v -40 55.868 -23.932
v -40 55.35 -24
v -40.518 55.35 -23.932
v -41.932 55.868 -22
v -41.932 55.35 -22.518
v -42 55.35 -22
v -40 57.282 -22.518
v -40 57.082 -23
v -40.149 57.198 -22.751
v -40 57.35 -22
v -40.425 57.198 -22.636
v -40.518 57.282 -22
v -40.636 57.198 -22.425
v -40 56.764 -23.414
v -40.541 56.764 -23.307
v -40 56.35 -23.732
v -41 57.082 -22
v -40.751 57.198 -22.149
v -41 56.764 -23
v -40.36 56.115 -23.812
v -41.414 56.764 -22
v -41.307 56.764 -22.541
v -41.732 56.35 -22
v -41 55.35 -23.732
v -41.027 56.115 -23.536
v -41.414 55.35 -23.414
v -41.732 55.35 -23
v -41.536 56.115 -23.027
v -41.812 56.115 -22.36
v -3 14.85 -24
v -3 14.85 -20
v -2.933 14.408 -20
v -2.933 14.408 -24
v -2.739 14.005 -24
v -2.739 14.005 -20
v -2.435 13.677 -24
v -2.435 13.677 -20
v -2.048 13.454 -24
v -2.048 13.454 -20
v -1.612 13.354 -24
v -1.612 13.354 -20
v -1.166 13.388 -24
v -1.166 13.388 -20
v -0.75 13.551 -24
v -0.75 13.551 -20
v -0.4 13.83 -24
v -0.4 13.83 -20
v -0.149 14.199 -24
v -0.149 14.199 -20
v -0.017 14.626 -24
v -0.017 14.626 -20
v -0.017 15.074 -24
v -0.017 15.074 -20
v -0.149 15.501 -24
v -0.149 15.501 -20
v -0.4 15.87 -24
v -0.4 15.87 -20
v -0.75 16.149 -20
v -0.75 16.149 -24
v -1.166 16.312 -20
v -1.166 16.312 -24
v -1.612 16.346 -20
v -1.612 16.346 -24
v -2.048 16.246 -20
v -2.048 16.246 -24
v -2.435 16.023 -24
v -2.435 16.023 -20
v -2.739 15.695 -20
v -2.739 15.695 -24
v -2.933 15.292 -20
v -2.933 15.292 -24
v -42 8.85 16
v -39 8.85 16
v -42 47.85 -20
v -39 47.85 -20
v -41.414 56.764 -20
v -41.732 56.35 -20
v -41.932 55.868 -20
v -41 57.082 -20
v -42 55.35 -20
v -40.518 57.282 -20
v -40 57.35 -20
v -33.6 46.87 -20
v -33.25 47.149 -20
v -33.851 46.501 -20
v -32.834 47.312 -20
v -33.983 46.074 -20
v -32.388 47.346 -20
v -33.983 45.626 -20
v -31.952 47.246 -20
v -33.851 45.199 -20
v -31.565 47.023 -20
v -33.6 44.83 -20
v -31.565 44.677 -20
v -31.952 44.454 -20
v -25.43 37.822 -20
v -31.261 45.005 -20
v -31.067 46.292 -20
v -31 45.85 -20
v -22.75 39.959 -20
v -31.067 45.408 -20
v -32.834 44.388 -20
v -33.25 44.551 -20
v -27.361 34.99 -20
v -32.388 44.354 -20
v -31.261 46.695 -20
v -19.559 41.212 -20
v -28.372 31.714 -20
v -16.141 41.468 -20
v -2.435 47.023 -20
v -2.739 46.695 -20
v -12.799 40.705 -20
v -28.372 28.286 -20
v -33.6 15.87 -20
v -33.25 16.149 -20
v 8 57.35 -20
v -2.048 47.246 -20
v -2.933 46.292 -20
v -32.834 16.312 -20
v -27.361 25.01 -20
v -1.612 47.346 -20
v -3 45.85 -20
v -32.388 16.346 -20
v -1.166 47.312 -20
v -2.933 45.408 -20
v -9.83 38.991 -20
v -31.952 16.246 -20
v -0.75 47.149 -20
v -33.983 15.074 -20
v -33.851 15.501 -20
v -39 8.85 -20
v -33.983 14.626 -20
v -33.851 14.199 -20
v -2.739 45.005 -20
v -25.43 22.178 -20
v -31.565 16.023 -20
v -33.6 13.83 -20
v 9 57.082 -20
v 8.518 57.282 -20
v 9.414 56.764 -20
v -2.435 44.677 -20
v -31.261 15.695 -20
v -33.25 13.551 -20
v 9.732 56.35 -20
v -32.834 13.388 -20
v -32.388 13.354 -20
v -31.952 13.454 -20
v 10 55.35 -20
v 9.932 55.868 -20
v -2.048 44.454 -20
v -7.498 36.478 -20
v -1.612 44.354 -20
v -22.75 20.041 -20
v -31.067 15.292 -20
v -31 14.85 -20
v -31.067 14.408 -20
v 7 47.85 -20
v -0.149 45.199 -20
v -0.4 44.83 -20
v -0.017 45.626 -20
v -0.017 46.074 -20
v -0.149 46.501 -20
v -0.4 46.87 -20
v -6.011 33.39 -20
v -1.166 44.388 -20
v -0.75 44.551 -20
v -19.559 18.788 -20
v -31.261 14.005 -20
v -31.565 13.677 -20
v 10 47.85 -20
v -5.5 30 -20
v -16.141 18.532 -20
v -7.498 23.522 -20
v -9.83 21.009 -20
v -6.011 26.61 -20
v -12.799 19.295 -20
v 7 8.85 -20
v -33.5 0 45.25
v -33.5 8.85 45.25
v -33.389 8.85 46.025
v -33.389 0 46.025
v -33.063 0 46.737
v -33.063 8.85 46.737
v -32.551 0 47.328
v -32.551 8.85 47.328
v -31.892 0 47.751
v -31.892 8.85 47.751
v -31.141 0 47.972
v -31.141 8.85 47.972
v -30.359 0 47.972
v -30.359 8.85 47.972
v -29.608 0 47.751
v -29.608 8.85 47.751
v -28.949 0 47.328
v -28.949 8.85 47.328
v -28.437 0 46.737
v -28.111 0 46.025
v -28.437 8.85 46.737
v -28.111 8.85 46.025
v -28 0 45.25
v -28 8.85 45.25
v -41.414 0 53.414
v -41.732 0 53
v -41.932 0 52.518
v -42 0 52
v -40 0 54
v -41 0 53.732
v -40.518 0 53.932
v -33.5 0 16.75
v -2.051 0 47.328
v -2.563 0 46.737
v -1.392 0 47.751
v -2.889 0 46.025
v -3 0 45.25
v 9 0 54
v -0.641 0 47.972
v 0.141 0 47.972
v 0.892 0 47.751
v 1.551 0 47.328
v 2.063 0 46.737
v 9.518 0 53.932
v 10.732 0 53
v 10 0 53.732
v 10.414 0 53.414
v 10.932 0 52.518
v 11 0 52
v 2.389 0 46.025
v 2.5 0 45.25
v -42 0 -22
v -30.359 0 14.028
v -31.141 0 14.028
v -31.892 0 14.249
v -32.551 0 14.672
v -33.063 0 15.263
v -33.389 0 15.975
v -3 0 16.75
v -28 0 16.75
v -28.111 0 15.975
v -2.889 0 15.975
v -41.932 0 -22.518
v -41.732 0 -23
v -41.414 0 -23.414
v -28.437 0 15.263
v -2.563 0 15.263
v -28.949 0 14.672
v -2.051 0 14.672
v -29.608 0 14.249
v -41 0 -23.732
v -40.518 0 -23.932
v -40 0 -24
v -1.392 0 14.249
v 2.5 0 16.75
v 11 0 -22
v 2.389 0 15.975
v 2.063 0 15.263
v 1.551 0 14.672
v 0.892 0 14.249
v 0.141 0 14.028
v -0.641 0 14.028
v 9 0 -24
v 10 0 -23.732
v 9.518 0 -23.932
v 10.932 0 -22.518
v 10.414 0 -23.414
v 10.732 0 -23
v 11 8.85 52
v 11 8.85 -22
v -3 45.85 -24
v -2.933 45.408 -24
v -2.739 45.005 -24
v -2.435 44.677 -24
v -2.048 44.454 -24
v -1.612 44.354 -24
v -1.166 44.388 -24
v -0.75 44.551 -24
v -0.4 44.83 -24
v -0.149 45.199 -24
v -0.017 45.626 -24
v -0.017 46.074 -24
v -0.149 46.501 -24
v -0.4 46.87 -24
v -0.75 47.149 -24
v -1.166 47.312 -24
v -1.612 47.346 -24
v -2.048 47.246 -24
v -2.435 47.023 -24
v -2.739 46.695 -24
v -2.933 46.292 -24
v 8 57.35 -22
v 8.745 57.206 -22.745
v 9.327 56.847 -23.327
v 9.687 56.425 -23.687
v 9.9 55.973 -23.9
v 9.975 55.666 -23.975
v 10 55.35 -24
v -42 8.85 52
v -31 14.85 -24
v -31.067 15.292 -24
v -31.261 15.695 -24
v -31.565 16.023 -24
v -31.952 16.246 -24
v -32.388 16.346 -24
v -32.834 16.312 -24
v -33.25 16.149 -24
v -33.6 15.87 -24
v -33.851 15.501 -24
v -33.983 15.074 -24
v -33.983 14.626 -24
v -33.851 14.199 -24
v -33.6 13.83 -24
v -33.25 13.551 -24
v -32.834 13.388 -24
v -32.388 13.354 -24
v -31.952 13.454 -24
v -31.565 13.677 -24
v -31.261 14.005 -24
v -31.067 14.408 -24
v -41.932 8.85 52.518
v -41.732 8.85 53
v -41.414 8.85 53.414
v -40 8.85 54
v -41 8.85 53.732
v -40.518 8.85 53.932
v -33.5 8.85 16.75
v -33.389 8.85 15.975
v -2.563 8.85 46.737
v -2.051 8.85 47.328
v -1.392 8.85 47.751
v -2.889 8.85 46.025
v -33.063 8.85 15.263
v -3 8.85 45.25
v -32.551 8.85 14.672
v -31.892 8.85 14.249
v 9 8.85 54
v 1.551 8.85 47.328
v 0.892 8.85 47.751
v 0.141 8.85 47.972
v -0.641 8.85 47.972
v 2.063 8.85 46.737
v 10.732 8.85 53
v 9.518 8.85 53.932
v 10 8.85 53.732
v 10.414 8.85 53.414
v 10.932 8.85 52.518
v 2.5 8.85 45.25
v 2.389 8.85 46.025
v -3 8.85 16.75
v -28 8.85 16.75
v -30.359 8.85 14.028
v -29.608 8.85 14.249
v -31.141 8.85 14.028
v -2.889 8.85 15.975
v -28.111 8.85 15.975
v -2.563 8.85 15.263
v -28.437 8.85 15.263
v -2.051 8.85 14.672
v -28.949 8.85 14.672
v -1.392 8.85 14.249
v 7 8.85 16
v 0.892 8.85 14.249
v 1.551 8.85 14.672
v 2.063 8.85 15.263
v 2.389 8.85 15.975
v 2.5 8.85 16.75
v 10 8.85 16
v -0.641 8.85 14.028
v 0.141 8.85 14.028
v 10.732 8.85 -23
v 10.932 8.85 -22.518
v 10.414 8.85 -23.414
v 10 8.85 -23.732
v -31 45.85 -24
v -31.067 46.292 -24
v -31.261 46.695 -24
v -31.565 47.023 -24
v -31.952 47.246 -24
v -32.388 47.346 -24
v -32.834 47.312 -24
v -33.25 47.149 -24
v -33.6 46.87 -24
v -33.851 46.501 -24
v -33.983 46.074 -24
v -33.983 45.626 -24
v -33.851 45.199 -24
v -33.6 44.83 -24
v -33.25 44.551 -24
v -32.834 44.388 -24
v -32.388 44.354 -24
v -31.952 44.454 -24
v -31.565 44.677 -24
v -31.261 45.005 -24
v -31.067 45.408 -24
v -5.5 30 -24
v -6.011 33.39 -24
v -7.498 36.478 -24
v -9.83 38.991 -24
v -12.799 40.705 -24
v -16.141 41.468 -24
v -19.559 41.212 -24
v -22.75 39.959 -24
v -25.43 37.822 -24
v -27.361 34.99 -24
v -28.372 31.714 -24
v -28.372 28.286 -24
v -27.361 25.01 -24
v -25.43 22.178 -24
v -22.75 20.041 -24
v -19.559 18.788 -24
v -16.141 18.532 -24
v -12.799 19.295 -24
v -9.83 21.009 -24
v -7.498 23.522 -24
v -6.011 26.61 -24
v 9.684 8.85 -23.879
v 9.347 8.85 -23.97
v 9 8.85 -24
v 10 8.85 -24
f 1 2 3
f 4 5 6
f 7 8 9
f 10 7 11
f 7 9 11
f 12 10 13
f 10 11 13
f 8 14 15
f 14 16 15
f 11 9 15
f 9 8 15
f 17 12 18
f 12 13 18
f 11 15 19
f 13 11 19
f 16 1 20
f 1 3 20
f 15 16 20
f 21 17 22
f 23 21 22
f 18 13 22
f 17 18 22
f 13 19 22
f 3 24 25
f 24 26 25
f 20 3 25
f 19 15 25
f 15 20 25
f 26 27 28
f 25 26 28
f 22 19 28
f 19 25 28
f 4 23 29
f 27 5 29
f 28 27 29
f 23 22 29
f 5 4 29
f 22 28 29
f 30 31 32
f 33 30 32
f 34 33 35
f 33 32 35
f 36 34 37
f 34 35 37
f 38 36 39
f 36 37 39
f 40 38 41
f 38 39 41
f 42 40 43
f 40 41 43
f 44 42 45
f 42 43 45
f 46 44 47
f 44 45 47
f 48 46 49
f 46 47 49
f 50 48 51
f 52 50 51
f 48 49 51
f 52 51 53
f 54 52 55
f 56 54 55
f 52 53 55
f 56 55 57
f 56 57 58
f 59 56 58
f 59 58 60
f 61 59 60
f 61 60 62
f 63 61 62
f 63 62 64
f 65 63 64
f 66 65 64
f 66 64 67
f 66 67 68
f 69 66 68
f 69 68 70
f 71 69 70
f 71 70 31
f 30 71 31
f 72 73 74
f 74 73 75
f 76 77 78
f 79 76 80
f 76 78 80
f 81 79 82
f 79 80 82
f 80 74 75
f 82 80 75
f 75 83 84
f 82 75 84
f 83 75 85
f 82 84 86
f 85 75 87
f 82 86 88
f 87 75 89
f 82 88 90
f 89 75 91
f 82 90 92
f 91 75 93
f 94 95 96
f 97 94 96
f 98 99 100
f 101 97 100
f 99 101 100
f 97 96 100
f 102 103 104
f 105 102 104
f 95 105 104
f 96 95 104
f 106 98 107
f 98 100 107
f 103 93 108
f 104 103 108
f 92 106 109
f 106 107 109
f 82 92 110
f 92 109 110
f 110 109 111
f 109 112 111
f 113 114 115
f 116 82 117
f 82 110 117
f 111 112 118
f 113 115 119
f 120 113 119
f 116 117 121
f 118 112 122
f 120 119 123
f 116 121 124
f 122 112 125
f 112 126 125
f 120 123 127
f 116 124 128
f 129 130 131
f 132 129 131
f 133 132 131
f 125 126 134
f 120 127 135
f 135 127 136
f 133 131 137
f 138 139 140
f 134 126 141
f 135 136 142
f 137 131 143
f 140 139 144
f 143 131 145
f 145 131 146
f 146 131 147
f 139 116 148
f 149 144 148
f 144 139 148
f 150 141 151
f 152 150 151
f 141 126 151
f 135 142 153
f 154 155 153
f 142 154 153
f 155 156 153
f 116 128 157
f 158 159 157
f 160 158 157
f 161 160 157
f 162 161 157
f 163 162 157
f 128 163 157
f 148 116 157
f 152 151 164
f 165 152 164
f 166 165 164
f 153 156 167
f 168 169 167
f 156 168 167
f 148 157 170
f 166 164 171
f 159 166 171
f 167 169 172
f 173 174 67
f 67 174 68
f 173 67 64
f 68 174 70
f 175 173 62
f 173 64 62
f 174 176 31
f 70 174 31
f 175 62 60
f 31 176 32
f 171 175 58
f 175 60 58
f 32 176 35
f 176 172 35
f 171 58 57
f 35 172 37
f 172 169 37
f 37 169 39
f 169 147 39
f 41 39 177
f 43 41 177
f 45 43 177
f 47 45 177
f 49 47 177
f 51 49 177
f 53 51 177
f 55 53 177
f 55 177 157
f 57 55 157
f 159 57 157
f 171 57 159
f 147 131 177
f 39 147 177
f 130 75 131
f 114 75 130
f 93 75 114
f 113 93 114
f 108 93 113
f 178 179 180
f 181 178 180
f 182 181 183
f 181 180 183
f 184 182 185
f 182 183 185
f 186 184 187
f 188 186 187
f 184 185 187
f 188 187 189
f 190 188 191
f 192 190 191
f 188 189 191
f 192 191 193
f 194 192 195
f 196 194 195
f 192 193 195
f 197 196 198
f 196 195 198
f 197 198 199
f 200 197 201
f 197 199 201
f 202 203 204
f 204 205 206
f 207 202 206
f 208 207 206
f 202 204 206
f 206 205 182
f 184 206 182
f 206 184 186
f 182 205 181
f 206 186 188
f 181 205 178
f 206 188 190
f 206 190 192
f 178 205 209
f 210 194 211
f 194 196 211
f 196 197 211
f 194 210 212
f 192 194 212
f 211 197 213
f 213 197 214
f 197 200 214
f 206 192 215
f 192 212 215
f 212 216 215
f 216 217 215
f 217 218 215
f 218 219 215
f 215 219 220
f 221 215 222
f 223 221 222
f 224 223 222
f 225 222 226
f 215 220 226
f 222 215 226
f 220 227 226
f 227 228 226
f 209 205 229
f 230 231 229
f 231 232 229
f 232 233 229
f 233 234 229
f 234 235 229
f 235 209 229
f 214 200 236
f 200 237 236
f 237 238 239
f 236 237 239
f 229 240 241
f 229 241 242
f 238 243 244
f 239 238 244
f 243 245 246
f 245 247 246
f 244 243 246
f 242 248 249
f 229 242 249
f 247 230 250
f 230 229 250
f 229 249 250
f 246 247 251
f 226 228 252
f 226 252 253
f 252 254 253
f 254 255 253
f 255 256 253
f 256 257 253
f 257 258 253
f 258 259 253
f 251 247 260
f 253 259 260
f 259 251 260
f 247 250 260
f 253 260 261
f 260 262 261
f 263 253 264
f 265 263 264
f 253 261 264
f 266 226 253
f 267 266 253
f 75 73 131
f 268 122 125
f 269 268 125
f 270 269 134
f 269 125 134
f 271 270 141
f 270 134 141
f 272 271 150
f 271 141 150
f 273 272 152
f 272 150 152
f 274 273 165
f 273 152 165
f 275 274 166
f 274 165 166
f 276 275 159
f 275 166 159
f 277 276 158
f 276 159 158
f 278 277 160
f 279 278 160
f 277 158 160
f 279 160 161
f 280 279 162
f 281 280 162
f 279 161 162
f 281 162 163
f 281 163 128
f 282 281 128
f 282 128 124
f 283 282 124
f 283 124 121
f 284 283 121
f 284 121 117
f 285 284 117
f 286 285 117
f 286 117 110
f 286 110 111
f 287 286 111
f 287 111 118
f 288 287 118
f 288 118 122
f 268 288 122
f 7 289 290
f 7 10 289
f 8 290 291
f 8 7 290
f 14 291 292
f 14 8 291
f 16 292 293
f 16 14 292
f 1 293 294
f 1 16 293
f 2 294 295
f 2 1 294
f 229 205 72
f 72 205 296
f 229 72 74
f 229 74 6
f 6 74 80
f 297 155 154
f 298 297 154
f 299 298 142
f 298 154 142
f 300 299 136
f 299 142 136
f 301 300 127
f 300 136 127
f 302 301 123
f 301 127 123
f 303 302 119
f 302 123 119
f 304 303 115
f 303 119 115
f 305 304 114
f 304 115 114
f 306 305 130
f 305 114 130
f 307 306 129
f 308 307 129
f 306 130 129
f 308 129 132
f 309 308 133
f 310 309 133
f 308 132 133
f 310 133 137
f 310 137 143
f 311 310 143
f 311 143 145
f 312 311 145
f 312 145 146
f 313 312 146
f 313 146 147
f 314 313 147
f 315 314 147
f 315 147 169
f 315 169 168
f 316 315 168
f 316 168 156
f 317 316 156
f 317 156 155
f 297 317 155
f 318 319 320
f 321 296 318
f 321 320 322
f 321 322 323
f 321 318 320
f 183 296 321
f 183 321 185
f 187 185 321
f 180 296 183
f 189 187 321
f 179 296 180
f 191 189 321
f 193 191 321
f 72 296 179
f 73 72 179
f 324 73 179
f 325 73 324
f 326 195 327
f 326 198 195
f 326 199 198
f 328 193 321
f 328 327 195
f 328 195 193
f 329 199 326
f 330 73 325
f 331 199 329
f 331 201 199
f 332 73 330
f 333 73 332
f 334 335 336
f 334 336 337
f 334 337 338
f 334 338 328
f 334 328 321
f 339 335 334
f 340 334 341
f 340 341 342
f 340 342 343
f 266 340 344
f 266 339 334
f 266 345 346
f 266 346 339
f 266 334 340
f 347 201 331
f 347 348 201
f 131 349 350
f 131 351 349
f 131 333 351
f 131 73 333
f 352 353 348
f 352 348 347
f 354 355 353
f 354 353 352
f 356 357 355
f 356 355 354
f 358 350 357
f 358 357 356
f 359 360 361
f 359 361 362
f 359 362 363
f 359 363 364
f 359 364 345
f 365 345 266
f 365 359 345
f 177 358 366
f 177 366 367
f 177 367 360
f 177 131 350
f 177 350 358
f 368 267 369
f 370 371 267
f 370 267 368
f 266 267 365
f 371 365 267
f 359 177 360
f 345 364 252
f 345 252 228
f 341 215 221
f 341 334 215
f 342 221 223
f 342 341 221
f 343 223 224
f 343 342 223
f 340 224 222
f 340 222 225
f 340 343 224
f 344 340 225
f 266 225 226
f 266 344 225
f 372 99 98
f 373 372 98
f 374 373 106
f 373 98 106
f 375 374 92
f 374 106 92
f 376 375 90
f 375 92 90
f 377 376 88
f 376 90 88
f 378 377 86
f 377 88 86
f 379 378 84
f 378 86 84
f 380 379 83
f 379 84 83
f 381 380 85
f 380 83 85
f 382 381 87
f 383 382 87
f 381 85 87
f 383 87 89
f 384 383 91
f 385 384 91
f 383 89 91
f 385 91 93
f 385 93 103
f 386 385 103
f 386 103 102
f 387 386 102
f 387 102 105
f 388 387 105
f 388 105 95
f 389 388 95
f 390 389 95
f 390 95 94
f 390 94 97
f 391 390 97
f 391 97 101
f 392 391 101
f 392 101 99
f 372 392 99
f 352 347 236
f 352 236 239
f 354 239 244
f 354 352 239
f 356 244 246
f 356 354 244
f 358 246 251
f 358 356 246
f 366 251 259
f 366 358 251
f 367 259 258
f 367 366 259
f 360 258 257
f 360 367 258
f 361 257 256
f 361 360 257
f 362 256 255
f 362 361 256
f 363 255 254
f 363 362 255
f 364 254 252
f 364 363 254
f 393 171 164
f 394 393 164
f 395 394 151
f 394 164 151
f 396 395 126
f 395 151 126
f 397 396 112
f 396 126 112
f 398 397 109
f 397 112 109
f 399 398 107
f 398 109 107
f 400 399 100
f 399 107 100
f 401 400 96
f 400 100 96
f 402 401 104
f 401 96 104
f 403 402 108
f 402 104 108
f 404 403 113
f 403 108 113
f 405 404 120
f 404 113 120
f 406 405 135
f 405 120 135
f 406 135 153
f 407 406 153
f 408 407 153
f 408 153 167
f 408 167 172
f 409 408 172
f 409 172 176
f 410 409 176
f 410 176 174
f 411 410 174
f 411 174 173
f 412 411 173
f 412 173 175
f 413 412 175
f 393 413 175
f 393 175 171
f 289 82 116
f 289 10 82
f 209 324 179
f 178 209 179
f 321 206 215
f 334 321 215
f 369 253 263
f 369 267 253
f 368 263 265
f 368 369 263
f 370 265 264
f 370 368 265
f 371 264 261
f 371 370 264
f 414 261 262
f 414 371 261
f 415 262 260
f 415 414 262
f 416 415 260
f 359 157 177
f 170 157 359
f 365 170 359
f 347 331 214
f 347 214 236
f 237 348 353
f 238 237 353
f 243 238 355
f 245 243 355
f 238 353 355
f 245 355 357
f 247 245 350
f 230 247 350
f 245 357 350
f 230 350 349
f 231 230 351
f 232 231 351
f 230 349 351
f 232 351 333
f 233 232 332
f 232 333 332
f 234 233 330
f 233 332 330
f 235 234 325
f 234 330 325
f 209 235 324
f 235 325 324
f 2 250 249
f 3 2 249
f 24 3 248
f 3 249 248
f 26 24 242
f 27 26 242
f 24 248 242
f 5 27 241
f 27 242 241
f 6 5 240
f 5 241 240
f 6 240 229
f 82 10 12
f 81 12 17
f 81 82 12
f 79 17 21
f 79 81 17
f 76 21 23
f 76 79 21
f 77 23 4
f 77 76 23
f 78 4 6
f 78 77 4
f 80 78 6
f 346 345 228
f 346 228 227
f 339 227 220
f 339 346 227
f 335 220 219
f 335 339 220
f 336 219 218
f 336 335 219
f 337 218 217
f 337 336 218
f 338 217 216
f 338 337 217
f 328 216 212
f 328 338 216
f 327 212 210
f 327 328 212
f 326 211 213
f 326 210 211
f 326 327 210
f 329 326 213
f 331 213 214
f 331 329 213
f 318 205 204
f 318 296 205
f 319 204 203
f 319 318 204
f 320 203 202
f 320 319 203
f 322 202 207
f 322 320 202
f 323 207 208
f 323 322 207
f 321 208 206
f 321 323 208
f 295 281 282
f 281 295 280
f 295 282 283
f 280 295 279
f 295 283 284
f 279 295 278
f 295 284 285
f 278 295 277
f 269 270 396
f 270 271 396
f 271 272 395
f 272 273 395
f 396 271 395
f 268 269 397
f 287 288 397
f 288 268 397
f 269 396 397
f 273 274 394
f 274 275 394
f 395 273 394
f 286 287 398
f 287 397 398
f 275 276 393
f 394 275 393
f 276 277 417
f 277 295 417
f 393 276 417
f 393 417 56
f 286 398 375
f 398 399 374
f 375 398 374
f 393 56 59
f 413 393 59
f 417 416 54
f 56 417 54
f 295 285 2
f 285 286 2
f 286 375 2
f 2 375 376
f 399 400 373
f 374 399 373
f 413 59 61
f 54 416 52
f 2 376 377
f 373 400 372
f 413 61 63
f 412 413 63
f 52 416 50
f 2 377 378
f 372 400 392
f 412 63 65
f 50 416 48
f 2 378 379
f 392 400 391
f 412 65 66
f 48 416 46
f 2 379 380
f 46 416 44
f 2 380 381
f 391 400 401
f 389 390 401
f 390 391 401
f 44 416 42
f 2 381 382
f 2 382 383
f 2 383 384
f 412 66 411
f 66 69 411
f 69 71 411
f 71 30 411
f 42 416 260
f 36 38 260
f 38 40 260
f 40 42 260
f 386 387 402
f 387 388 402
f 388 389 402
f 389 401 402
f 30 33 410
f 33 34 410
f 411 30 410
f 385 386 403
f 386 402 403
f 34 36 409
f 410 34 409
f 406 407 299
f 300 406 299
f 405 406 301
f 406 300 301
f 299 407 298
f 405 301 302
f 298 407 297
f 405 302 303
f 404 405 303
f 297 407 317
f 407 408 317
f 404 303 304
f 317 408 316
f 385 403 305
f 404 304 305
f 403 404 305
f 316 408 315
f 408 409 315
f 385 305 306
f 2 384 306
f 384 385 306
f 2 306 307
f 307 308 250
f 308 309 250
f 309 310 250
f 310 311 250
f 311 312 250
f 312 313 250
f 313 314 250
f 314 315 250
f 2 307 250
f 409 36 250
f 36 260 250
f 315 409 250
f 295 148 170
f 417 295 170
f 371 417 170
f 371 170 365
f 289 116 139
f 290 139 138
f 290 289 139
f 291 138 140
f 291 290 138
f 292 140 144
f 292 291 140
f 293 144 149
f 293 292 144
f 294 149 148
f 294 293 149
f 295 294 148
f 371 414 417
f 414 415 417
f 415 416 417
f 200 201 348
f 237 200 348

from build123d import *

# Parameters (mm, degrees)
SKETCH1_W               = 53
SKETCH1_H               = 78
BOSS_EXTRUDE1_DEPTH     = 8.85
FILLET2_R               = 2
CUT_EXTRUDE1_DEPTH      = 69.980595097
CUT_EXTRUDE1_DEPTH_BACK = 69.980595097
BOSS_EXTRUDE2_DEPTH     = 48.5
FILLET4_R               = 2
RIB7_REACH              = 96.942
SKETCH4_WALL_W          = 244.959830248
SKETCH4_WALL_H          = 3
RIB8_REACH              = 96.388
SKETCH6_WALL_W          = 243.850654762
SKETCH6_WALL_H          = 3
SKETCH7_R               = 11.5
SKETCH7_R_2             = 1.5
CUT_EXTRUDE2_DEPTH      = 103.611025236


with BuildPart() as part:
    # Sketch1 → Boss-Extrude1 (new body)
    with BuildSketch(Plane(origin=(0, 0, 0), x_dir=(1, 0, 0), z_dir=(0, 1, 0))):
        with Locations((-15.5, -15)):
            Rectangle(SKETCH1_W, SKETCH1_H)
    extrude(amount=BOSS_EXTRUDE1_DEPTH)

    # Fillet2
    fillet2_edges = [part.edges().sort_by_distance(p)[0] for p in [
        (-42, 4.425, -24),
        (11, 4.425, -24),
        (11, 4.425, 54),
        (-42, 4.425, 54),
    ]]
    fillet(fillet2_edges, radius=FILLET2_R)

    # Sketch2 → Cut-Extrude1 (cut, two sides)
    with BuildSketch(Plane(origin=(0, 8.85, 0), x_dir=(1, 0, 0), z_dir=(0, 1, 0))) as cut_extrude1_sk:
        with BuildLine():
            Line((-33.5, -16.75), (-33.5, -45.25))
            ThreePointArc((-33.5, -45.25), (-30.749999997, -48), (-28, -45.249999994))
            Line((-28, -45.249999994), (-28, -16.75))
            ThreePointArc((-28, -16.75), (-30.75, -14), (-33.5, -16.75))
        make_face()
        with BuildLine():
            Line((2.5, -16.75), (2.5, -45.25))
            ThreePointArc((2.5, -45.25), (-0.250000003, -48), (-3, -45.249999994))
            Line((-3, -45.249999994), (-3, -16.75))
            ThreePointArc((-3, -16.75), (-0.25, -14), (2.5, -16.75))
        make_face()
    extrude(amount=CUT_EXTRUDE1_DEPTH, mode=Mode.SUBTRACT)
    extrude(cut_extrude1_sk.sketch, amount=-CUT_EXTRUDE1_DEPTH_BACK, mode=Mode.SUBTRACT)

    # Sketch3 → Boss-Extrude2 (add)
    with BuildSketch(Plane(origin=(0, 8.85, 0), x_dir=(1, 0, 0), z_dir=(0, 1, 0))):
        with BuildLine():
            Line((-42, 20), (10, 20))
            Line((10, 20), (10, 24))
            Line((10, 24), (-40, 24))
            ThreePointArc((-40, 24), (-41.414213562, 23.414213562), (-42, 22))
            Line((-42, 22), (-42, 20))
        make_face()
    extrude(amount=BOSS_EXTRUDE2_DEPTH)

    # Fillet4
    fillet4_edges = [part.edges().sort_by_distance(p)[0] for p in [
        (-42, 57.35, -21),
        (10, 57.35, -22),
        (-15, 57.35, -24),
        (-41.414213562, 57.35, -23.414213562),
    ]]
    fillet(fillet4_edges, radius=FILLET4_R)

    # Sketch4 wall → Rib7 (add, up to next)
    with BuildSketch(Plane(origin=(-42, 28.35, -2), x_dir=(0, 0.734803444627, -0.678280102733), z_dir=(0, -0.678280102733, -0.734803444627)), mode=Mode.PRIVATE) as rib7_sk1:
        with Locations((0, 1.5)):
            Rectangle(SKETCH4_WALL_W, SKETCH4_WALL_H)
    rib7_tool1 = extrude(rib7_sk1.sketch, amount=RIB7_REACH, mode=Mode.PRIVATE) - part.part
    add(rib7_tool1.solids().sort_by_distance((-42, 28.35, -2))[0])

    # Sketch6 wall → Rib8 (add, up to next)
    with BuildSketch(Plane(origin=(10, 28.35, -2), x_dir=(0, -0.734803444627, 0.678280102733), z_dir=(0, -0.678280102733, -0.734803444627)), mode=Mode.PRIVATE) as rib8_sk1:
        with Locations((0, 1.5)):
            Rectangle(SKETCH6_WALL_W, SKETCH6_WALL_H)
    rib8_tool1 = extrude(rib8_sk1.sketch, amount=RIB8_REACH, mode=Mode.PRIVATE) - part.part
    add(rib8_tool1.solids().sort_by_distance((10, 28.35, -2))[0])

    # Sketch7 → Cut-Extrude2 (cut, through all)
    with BuildSketch(Plane.XY.offset(-20)):
        with Locations((-17, 30)):
            Circle(SKETCH7_R)
        with Locations((-32.5, 45.85)):
            Circle(SKETCH7_R_2)
        with Locations((-32.5, 14.85)):
            Circle(SKETCH7_R_2)
        with Locations(Location((-1.5, 14.85, 0), (0, 0, 180))):
            Circle(SKETCH7_R_2)
        with Locations(Location((-1.5, 45.85, 0), (0, 0, 180))):
            Circle(SKETCH7_R_2)
    extrude(amount=-CUT_EXTRUDE2_DEPTH, mode=Mode.SUBTRACT)


solid = part.part
